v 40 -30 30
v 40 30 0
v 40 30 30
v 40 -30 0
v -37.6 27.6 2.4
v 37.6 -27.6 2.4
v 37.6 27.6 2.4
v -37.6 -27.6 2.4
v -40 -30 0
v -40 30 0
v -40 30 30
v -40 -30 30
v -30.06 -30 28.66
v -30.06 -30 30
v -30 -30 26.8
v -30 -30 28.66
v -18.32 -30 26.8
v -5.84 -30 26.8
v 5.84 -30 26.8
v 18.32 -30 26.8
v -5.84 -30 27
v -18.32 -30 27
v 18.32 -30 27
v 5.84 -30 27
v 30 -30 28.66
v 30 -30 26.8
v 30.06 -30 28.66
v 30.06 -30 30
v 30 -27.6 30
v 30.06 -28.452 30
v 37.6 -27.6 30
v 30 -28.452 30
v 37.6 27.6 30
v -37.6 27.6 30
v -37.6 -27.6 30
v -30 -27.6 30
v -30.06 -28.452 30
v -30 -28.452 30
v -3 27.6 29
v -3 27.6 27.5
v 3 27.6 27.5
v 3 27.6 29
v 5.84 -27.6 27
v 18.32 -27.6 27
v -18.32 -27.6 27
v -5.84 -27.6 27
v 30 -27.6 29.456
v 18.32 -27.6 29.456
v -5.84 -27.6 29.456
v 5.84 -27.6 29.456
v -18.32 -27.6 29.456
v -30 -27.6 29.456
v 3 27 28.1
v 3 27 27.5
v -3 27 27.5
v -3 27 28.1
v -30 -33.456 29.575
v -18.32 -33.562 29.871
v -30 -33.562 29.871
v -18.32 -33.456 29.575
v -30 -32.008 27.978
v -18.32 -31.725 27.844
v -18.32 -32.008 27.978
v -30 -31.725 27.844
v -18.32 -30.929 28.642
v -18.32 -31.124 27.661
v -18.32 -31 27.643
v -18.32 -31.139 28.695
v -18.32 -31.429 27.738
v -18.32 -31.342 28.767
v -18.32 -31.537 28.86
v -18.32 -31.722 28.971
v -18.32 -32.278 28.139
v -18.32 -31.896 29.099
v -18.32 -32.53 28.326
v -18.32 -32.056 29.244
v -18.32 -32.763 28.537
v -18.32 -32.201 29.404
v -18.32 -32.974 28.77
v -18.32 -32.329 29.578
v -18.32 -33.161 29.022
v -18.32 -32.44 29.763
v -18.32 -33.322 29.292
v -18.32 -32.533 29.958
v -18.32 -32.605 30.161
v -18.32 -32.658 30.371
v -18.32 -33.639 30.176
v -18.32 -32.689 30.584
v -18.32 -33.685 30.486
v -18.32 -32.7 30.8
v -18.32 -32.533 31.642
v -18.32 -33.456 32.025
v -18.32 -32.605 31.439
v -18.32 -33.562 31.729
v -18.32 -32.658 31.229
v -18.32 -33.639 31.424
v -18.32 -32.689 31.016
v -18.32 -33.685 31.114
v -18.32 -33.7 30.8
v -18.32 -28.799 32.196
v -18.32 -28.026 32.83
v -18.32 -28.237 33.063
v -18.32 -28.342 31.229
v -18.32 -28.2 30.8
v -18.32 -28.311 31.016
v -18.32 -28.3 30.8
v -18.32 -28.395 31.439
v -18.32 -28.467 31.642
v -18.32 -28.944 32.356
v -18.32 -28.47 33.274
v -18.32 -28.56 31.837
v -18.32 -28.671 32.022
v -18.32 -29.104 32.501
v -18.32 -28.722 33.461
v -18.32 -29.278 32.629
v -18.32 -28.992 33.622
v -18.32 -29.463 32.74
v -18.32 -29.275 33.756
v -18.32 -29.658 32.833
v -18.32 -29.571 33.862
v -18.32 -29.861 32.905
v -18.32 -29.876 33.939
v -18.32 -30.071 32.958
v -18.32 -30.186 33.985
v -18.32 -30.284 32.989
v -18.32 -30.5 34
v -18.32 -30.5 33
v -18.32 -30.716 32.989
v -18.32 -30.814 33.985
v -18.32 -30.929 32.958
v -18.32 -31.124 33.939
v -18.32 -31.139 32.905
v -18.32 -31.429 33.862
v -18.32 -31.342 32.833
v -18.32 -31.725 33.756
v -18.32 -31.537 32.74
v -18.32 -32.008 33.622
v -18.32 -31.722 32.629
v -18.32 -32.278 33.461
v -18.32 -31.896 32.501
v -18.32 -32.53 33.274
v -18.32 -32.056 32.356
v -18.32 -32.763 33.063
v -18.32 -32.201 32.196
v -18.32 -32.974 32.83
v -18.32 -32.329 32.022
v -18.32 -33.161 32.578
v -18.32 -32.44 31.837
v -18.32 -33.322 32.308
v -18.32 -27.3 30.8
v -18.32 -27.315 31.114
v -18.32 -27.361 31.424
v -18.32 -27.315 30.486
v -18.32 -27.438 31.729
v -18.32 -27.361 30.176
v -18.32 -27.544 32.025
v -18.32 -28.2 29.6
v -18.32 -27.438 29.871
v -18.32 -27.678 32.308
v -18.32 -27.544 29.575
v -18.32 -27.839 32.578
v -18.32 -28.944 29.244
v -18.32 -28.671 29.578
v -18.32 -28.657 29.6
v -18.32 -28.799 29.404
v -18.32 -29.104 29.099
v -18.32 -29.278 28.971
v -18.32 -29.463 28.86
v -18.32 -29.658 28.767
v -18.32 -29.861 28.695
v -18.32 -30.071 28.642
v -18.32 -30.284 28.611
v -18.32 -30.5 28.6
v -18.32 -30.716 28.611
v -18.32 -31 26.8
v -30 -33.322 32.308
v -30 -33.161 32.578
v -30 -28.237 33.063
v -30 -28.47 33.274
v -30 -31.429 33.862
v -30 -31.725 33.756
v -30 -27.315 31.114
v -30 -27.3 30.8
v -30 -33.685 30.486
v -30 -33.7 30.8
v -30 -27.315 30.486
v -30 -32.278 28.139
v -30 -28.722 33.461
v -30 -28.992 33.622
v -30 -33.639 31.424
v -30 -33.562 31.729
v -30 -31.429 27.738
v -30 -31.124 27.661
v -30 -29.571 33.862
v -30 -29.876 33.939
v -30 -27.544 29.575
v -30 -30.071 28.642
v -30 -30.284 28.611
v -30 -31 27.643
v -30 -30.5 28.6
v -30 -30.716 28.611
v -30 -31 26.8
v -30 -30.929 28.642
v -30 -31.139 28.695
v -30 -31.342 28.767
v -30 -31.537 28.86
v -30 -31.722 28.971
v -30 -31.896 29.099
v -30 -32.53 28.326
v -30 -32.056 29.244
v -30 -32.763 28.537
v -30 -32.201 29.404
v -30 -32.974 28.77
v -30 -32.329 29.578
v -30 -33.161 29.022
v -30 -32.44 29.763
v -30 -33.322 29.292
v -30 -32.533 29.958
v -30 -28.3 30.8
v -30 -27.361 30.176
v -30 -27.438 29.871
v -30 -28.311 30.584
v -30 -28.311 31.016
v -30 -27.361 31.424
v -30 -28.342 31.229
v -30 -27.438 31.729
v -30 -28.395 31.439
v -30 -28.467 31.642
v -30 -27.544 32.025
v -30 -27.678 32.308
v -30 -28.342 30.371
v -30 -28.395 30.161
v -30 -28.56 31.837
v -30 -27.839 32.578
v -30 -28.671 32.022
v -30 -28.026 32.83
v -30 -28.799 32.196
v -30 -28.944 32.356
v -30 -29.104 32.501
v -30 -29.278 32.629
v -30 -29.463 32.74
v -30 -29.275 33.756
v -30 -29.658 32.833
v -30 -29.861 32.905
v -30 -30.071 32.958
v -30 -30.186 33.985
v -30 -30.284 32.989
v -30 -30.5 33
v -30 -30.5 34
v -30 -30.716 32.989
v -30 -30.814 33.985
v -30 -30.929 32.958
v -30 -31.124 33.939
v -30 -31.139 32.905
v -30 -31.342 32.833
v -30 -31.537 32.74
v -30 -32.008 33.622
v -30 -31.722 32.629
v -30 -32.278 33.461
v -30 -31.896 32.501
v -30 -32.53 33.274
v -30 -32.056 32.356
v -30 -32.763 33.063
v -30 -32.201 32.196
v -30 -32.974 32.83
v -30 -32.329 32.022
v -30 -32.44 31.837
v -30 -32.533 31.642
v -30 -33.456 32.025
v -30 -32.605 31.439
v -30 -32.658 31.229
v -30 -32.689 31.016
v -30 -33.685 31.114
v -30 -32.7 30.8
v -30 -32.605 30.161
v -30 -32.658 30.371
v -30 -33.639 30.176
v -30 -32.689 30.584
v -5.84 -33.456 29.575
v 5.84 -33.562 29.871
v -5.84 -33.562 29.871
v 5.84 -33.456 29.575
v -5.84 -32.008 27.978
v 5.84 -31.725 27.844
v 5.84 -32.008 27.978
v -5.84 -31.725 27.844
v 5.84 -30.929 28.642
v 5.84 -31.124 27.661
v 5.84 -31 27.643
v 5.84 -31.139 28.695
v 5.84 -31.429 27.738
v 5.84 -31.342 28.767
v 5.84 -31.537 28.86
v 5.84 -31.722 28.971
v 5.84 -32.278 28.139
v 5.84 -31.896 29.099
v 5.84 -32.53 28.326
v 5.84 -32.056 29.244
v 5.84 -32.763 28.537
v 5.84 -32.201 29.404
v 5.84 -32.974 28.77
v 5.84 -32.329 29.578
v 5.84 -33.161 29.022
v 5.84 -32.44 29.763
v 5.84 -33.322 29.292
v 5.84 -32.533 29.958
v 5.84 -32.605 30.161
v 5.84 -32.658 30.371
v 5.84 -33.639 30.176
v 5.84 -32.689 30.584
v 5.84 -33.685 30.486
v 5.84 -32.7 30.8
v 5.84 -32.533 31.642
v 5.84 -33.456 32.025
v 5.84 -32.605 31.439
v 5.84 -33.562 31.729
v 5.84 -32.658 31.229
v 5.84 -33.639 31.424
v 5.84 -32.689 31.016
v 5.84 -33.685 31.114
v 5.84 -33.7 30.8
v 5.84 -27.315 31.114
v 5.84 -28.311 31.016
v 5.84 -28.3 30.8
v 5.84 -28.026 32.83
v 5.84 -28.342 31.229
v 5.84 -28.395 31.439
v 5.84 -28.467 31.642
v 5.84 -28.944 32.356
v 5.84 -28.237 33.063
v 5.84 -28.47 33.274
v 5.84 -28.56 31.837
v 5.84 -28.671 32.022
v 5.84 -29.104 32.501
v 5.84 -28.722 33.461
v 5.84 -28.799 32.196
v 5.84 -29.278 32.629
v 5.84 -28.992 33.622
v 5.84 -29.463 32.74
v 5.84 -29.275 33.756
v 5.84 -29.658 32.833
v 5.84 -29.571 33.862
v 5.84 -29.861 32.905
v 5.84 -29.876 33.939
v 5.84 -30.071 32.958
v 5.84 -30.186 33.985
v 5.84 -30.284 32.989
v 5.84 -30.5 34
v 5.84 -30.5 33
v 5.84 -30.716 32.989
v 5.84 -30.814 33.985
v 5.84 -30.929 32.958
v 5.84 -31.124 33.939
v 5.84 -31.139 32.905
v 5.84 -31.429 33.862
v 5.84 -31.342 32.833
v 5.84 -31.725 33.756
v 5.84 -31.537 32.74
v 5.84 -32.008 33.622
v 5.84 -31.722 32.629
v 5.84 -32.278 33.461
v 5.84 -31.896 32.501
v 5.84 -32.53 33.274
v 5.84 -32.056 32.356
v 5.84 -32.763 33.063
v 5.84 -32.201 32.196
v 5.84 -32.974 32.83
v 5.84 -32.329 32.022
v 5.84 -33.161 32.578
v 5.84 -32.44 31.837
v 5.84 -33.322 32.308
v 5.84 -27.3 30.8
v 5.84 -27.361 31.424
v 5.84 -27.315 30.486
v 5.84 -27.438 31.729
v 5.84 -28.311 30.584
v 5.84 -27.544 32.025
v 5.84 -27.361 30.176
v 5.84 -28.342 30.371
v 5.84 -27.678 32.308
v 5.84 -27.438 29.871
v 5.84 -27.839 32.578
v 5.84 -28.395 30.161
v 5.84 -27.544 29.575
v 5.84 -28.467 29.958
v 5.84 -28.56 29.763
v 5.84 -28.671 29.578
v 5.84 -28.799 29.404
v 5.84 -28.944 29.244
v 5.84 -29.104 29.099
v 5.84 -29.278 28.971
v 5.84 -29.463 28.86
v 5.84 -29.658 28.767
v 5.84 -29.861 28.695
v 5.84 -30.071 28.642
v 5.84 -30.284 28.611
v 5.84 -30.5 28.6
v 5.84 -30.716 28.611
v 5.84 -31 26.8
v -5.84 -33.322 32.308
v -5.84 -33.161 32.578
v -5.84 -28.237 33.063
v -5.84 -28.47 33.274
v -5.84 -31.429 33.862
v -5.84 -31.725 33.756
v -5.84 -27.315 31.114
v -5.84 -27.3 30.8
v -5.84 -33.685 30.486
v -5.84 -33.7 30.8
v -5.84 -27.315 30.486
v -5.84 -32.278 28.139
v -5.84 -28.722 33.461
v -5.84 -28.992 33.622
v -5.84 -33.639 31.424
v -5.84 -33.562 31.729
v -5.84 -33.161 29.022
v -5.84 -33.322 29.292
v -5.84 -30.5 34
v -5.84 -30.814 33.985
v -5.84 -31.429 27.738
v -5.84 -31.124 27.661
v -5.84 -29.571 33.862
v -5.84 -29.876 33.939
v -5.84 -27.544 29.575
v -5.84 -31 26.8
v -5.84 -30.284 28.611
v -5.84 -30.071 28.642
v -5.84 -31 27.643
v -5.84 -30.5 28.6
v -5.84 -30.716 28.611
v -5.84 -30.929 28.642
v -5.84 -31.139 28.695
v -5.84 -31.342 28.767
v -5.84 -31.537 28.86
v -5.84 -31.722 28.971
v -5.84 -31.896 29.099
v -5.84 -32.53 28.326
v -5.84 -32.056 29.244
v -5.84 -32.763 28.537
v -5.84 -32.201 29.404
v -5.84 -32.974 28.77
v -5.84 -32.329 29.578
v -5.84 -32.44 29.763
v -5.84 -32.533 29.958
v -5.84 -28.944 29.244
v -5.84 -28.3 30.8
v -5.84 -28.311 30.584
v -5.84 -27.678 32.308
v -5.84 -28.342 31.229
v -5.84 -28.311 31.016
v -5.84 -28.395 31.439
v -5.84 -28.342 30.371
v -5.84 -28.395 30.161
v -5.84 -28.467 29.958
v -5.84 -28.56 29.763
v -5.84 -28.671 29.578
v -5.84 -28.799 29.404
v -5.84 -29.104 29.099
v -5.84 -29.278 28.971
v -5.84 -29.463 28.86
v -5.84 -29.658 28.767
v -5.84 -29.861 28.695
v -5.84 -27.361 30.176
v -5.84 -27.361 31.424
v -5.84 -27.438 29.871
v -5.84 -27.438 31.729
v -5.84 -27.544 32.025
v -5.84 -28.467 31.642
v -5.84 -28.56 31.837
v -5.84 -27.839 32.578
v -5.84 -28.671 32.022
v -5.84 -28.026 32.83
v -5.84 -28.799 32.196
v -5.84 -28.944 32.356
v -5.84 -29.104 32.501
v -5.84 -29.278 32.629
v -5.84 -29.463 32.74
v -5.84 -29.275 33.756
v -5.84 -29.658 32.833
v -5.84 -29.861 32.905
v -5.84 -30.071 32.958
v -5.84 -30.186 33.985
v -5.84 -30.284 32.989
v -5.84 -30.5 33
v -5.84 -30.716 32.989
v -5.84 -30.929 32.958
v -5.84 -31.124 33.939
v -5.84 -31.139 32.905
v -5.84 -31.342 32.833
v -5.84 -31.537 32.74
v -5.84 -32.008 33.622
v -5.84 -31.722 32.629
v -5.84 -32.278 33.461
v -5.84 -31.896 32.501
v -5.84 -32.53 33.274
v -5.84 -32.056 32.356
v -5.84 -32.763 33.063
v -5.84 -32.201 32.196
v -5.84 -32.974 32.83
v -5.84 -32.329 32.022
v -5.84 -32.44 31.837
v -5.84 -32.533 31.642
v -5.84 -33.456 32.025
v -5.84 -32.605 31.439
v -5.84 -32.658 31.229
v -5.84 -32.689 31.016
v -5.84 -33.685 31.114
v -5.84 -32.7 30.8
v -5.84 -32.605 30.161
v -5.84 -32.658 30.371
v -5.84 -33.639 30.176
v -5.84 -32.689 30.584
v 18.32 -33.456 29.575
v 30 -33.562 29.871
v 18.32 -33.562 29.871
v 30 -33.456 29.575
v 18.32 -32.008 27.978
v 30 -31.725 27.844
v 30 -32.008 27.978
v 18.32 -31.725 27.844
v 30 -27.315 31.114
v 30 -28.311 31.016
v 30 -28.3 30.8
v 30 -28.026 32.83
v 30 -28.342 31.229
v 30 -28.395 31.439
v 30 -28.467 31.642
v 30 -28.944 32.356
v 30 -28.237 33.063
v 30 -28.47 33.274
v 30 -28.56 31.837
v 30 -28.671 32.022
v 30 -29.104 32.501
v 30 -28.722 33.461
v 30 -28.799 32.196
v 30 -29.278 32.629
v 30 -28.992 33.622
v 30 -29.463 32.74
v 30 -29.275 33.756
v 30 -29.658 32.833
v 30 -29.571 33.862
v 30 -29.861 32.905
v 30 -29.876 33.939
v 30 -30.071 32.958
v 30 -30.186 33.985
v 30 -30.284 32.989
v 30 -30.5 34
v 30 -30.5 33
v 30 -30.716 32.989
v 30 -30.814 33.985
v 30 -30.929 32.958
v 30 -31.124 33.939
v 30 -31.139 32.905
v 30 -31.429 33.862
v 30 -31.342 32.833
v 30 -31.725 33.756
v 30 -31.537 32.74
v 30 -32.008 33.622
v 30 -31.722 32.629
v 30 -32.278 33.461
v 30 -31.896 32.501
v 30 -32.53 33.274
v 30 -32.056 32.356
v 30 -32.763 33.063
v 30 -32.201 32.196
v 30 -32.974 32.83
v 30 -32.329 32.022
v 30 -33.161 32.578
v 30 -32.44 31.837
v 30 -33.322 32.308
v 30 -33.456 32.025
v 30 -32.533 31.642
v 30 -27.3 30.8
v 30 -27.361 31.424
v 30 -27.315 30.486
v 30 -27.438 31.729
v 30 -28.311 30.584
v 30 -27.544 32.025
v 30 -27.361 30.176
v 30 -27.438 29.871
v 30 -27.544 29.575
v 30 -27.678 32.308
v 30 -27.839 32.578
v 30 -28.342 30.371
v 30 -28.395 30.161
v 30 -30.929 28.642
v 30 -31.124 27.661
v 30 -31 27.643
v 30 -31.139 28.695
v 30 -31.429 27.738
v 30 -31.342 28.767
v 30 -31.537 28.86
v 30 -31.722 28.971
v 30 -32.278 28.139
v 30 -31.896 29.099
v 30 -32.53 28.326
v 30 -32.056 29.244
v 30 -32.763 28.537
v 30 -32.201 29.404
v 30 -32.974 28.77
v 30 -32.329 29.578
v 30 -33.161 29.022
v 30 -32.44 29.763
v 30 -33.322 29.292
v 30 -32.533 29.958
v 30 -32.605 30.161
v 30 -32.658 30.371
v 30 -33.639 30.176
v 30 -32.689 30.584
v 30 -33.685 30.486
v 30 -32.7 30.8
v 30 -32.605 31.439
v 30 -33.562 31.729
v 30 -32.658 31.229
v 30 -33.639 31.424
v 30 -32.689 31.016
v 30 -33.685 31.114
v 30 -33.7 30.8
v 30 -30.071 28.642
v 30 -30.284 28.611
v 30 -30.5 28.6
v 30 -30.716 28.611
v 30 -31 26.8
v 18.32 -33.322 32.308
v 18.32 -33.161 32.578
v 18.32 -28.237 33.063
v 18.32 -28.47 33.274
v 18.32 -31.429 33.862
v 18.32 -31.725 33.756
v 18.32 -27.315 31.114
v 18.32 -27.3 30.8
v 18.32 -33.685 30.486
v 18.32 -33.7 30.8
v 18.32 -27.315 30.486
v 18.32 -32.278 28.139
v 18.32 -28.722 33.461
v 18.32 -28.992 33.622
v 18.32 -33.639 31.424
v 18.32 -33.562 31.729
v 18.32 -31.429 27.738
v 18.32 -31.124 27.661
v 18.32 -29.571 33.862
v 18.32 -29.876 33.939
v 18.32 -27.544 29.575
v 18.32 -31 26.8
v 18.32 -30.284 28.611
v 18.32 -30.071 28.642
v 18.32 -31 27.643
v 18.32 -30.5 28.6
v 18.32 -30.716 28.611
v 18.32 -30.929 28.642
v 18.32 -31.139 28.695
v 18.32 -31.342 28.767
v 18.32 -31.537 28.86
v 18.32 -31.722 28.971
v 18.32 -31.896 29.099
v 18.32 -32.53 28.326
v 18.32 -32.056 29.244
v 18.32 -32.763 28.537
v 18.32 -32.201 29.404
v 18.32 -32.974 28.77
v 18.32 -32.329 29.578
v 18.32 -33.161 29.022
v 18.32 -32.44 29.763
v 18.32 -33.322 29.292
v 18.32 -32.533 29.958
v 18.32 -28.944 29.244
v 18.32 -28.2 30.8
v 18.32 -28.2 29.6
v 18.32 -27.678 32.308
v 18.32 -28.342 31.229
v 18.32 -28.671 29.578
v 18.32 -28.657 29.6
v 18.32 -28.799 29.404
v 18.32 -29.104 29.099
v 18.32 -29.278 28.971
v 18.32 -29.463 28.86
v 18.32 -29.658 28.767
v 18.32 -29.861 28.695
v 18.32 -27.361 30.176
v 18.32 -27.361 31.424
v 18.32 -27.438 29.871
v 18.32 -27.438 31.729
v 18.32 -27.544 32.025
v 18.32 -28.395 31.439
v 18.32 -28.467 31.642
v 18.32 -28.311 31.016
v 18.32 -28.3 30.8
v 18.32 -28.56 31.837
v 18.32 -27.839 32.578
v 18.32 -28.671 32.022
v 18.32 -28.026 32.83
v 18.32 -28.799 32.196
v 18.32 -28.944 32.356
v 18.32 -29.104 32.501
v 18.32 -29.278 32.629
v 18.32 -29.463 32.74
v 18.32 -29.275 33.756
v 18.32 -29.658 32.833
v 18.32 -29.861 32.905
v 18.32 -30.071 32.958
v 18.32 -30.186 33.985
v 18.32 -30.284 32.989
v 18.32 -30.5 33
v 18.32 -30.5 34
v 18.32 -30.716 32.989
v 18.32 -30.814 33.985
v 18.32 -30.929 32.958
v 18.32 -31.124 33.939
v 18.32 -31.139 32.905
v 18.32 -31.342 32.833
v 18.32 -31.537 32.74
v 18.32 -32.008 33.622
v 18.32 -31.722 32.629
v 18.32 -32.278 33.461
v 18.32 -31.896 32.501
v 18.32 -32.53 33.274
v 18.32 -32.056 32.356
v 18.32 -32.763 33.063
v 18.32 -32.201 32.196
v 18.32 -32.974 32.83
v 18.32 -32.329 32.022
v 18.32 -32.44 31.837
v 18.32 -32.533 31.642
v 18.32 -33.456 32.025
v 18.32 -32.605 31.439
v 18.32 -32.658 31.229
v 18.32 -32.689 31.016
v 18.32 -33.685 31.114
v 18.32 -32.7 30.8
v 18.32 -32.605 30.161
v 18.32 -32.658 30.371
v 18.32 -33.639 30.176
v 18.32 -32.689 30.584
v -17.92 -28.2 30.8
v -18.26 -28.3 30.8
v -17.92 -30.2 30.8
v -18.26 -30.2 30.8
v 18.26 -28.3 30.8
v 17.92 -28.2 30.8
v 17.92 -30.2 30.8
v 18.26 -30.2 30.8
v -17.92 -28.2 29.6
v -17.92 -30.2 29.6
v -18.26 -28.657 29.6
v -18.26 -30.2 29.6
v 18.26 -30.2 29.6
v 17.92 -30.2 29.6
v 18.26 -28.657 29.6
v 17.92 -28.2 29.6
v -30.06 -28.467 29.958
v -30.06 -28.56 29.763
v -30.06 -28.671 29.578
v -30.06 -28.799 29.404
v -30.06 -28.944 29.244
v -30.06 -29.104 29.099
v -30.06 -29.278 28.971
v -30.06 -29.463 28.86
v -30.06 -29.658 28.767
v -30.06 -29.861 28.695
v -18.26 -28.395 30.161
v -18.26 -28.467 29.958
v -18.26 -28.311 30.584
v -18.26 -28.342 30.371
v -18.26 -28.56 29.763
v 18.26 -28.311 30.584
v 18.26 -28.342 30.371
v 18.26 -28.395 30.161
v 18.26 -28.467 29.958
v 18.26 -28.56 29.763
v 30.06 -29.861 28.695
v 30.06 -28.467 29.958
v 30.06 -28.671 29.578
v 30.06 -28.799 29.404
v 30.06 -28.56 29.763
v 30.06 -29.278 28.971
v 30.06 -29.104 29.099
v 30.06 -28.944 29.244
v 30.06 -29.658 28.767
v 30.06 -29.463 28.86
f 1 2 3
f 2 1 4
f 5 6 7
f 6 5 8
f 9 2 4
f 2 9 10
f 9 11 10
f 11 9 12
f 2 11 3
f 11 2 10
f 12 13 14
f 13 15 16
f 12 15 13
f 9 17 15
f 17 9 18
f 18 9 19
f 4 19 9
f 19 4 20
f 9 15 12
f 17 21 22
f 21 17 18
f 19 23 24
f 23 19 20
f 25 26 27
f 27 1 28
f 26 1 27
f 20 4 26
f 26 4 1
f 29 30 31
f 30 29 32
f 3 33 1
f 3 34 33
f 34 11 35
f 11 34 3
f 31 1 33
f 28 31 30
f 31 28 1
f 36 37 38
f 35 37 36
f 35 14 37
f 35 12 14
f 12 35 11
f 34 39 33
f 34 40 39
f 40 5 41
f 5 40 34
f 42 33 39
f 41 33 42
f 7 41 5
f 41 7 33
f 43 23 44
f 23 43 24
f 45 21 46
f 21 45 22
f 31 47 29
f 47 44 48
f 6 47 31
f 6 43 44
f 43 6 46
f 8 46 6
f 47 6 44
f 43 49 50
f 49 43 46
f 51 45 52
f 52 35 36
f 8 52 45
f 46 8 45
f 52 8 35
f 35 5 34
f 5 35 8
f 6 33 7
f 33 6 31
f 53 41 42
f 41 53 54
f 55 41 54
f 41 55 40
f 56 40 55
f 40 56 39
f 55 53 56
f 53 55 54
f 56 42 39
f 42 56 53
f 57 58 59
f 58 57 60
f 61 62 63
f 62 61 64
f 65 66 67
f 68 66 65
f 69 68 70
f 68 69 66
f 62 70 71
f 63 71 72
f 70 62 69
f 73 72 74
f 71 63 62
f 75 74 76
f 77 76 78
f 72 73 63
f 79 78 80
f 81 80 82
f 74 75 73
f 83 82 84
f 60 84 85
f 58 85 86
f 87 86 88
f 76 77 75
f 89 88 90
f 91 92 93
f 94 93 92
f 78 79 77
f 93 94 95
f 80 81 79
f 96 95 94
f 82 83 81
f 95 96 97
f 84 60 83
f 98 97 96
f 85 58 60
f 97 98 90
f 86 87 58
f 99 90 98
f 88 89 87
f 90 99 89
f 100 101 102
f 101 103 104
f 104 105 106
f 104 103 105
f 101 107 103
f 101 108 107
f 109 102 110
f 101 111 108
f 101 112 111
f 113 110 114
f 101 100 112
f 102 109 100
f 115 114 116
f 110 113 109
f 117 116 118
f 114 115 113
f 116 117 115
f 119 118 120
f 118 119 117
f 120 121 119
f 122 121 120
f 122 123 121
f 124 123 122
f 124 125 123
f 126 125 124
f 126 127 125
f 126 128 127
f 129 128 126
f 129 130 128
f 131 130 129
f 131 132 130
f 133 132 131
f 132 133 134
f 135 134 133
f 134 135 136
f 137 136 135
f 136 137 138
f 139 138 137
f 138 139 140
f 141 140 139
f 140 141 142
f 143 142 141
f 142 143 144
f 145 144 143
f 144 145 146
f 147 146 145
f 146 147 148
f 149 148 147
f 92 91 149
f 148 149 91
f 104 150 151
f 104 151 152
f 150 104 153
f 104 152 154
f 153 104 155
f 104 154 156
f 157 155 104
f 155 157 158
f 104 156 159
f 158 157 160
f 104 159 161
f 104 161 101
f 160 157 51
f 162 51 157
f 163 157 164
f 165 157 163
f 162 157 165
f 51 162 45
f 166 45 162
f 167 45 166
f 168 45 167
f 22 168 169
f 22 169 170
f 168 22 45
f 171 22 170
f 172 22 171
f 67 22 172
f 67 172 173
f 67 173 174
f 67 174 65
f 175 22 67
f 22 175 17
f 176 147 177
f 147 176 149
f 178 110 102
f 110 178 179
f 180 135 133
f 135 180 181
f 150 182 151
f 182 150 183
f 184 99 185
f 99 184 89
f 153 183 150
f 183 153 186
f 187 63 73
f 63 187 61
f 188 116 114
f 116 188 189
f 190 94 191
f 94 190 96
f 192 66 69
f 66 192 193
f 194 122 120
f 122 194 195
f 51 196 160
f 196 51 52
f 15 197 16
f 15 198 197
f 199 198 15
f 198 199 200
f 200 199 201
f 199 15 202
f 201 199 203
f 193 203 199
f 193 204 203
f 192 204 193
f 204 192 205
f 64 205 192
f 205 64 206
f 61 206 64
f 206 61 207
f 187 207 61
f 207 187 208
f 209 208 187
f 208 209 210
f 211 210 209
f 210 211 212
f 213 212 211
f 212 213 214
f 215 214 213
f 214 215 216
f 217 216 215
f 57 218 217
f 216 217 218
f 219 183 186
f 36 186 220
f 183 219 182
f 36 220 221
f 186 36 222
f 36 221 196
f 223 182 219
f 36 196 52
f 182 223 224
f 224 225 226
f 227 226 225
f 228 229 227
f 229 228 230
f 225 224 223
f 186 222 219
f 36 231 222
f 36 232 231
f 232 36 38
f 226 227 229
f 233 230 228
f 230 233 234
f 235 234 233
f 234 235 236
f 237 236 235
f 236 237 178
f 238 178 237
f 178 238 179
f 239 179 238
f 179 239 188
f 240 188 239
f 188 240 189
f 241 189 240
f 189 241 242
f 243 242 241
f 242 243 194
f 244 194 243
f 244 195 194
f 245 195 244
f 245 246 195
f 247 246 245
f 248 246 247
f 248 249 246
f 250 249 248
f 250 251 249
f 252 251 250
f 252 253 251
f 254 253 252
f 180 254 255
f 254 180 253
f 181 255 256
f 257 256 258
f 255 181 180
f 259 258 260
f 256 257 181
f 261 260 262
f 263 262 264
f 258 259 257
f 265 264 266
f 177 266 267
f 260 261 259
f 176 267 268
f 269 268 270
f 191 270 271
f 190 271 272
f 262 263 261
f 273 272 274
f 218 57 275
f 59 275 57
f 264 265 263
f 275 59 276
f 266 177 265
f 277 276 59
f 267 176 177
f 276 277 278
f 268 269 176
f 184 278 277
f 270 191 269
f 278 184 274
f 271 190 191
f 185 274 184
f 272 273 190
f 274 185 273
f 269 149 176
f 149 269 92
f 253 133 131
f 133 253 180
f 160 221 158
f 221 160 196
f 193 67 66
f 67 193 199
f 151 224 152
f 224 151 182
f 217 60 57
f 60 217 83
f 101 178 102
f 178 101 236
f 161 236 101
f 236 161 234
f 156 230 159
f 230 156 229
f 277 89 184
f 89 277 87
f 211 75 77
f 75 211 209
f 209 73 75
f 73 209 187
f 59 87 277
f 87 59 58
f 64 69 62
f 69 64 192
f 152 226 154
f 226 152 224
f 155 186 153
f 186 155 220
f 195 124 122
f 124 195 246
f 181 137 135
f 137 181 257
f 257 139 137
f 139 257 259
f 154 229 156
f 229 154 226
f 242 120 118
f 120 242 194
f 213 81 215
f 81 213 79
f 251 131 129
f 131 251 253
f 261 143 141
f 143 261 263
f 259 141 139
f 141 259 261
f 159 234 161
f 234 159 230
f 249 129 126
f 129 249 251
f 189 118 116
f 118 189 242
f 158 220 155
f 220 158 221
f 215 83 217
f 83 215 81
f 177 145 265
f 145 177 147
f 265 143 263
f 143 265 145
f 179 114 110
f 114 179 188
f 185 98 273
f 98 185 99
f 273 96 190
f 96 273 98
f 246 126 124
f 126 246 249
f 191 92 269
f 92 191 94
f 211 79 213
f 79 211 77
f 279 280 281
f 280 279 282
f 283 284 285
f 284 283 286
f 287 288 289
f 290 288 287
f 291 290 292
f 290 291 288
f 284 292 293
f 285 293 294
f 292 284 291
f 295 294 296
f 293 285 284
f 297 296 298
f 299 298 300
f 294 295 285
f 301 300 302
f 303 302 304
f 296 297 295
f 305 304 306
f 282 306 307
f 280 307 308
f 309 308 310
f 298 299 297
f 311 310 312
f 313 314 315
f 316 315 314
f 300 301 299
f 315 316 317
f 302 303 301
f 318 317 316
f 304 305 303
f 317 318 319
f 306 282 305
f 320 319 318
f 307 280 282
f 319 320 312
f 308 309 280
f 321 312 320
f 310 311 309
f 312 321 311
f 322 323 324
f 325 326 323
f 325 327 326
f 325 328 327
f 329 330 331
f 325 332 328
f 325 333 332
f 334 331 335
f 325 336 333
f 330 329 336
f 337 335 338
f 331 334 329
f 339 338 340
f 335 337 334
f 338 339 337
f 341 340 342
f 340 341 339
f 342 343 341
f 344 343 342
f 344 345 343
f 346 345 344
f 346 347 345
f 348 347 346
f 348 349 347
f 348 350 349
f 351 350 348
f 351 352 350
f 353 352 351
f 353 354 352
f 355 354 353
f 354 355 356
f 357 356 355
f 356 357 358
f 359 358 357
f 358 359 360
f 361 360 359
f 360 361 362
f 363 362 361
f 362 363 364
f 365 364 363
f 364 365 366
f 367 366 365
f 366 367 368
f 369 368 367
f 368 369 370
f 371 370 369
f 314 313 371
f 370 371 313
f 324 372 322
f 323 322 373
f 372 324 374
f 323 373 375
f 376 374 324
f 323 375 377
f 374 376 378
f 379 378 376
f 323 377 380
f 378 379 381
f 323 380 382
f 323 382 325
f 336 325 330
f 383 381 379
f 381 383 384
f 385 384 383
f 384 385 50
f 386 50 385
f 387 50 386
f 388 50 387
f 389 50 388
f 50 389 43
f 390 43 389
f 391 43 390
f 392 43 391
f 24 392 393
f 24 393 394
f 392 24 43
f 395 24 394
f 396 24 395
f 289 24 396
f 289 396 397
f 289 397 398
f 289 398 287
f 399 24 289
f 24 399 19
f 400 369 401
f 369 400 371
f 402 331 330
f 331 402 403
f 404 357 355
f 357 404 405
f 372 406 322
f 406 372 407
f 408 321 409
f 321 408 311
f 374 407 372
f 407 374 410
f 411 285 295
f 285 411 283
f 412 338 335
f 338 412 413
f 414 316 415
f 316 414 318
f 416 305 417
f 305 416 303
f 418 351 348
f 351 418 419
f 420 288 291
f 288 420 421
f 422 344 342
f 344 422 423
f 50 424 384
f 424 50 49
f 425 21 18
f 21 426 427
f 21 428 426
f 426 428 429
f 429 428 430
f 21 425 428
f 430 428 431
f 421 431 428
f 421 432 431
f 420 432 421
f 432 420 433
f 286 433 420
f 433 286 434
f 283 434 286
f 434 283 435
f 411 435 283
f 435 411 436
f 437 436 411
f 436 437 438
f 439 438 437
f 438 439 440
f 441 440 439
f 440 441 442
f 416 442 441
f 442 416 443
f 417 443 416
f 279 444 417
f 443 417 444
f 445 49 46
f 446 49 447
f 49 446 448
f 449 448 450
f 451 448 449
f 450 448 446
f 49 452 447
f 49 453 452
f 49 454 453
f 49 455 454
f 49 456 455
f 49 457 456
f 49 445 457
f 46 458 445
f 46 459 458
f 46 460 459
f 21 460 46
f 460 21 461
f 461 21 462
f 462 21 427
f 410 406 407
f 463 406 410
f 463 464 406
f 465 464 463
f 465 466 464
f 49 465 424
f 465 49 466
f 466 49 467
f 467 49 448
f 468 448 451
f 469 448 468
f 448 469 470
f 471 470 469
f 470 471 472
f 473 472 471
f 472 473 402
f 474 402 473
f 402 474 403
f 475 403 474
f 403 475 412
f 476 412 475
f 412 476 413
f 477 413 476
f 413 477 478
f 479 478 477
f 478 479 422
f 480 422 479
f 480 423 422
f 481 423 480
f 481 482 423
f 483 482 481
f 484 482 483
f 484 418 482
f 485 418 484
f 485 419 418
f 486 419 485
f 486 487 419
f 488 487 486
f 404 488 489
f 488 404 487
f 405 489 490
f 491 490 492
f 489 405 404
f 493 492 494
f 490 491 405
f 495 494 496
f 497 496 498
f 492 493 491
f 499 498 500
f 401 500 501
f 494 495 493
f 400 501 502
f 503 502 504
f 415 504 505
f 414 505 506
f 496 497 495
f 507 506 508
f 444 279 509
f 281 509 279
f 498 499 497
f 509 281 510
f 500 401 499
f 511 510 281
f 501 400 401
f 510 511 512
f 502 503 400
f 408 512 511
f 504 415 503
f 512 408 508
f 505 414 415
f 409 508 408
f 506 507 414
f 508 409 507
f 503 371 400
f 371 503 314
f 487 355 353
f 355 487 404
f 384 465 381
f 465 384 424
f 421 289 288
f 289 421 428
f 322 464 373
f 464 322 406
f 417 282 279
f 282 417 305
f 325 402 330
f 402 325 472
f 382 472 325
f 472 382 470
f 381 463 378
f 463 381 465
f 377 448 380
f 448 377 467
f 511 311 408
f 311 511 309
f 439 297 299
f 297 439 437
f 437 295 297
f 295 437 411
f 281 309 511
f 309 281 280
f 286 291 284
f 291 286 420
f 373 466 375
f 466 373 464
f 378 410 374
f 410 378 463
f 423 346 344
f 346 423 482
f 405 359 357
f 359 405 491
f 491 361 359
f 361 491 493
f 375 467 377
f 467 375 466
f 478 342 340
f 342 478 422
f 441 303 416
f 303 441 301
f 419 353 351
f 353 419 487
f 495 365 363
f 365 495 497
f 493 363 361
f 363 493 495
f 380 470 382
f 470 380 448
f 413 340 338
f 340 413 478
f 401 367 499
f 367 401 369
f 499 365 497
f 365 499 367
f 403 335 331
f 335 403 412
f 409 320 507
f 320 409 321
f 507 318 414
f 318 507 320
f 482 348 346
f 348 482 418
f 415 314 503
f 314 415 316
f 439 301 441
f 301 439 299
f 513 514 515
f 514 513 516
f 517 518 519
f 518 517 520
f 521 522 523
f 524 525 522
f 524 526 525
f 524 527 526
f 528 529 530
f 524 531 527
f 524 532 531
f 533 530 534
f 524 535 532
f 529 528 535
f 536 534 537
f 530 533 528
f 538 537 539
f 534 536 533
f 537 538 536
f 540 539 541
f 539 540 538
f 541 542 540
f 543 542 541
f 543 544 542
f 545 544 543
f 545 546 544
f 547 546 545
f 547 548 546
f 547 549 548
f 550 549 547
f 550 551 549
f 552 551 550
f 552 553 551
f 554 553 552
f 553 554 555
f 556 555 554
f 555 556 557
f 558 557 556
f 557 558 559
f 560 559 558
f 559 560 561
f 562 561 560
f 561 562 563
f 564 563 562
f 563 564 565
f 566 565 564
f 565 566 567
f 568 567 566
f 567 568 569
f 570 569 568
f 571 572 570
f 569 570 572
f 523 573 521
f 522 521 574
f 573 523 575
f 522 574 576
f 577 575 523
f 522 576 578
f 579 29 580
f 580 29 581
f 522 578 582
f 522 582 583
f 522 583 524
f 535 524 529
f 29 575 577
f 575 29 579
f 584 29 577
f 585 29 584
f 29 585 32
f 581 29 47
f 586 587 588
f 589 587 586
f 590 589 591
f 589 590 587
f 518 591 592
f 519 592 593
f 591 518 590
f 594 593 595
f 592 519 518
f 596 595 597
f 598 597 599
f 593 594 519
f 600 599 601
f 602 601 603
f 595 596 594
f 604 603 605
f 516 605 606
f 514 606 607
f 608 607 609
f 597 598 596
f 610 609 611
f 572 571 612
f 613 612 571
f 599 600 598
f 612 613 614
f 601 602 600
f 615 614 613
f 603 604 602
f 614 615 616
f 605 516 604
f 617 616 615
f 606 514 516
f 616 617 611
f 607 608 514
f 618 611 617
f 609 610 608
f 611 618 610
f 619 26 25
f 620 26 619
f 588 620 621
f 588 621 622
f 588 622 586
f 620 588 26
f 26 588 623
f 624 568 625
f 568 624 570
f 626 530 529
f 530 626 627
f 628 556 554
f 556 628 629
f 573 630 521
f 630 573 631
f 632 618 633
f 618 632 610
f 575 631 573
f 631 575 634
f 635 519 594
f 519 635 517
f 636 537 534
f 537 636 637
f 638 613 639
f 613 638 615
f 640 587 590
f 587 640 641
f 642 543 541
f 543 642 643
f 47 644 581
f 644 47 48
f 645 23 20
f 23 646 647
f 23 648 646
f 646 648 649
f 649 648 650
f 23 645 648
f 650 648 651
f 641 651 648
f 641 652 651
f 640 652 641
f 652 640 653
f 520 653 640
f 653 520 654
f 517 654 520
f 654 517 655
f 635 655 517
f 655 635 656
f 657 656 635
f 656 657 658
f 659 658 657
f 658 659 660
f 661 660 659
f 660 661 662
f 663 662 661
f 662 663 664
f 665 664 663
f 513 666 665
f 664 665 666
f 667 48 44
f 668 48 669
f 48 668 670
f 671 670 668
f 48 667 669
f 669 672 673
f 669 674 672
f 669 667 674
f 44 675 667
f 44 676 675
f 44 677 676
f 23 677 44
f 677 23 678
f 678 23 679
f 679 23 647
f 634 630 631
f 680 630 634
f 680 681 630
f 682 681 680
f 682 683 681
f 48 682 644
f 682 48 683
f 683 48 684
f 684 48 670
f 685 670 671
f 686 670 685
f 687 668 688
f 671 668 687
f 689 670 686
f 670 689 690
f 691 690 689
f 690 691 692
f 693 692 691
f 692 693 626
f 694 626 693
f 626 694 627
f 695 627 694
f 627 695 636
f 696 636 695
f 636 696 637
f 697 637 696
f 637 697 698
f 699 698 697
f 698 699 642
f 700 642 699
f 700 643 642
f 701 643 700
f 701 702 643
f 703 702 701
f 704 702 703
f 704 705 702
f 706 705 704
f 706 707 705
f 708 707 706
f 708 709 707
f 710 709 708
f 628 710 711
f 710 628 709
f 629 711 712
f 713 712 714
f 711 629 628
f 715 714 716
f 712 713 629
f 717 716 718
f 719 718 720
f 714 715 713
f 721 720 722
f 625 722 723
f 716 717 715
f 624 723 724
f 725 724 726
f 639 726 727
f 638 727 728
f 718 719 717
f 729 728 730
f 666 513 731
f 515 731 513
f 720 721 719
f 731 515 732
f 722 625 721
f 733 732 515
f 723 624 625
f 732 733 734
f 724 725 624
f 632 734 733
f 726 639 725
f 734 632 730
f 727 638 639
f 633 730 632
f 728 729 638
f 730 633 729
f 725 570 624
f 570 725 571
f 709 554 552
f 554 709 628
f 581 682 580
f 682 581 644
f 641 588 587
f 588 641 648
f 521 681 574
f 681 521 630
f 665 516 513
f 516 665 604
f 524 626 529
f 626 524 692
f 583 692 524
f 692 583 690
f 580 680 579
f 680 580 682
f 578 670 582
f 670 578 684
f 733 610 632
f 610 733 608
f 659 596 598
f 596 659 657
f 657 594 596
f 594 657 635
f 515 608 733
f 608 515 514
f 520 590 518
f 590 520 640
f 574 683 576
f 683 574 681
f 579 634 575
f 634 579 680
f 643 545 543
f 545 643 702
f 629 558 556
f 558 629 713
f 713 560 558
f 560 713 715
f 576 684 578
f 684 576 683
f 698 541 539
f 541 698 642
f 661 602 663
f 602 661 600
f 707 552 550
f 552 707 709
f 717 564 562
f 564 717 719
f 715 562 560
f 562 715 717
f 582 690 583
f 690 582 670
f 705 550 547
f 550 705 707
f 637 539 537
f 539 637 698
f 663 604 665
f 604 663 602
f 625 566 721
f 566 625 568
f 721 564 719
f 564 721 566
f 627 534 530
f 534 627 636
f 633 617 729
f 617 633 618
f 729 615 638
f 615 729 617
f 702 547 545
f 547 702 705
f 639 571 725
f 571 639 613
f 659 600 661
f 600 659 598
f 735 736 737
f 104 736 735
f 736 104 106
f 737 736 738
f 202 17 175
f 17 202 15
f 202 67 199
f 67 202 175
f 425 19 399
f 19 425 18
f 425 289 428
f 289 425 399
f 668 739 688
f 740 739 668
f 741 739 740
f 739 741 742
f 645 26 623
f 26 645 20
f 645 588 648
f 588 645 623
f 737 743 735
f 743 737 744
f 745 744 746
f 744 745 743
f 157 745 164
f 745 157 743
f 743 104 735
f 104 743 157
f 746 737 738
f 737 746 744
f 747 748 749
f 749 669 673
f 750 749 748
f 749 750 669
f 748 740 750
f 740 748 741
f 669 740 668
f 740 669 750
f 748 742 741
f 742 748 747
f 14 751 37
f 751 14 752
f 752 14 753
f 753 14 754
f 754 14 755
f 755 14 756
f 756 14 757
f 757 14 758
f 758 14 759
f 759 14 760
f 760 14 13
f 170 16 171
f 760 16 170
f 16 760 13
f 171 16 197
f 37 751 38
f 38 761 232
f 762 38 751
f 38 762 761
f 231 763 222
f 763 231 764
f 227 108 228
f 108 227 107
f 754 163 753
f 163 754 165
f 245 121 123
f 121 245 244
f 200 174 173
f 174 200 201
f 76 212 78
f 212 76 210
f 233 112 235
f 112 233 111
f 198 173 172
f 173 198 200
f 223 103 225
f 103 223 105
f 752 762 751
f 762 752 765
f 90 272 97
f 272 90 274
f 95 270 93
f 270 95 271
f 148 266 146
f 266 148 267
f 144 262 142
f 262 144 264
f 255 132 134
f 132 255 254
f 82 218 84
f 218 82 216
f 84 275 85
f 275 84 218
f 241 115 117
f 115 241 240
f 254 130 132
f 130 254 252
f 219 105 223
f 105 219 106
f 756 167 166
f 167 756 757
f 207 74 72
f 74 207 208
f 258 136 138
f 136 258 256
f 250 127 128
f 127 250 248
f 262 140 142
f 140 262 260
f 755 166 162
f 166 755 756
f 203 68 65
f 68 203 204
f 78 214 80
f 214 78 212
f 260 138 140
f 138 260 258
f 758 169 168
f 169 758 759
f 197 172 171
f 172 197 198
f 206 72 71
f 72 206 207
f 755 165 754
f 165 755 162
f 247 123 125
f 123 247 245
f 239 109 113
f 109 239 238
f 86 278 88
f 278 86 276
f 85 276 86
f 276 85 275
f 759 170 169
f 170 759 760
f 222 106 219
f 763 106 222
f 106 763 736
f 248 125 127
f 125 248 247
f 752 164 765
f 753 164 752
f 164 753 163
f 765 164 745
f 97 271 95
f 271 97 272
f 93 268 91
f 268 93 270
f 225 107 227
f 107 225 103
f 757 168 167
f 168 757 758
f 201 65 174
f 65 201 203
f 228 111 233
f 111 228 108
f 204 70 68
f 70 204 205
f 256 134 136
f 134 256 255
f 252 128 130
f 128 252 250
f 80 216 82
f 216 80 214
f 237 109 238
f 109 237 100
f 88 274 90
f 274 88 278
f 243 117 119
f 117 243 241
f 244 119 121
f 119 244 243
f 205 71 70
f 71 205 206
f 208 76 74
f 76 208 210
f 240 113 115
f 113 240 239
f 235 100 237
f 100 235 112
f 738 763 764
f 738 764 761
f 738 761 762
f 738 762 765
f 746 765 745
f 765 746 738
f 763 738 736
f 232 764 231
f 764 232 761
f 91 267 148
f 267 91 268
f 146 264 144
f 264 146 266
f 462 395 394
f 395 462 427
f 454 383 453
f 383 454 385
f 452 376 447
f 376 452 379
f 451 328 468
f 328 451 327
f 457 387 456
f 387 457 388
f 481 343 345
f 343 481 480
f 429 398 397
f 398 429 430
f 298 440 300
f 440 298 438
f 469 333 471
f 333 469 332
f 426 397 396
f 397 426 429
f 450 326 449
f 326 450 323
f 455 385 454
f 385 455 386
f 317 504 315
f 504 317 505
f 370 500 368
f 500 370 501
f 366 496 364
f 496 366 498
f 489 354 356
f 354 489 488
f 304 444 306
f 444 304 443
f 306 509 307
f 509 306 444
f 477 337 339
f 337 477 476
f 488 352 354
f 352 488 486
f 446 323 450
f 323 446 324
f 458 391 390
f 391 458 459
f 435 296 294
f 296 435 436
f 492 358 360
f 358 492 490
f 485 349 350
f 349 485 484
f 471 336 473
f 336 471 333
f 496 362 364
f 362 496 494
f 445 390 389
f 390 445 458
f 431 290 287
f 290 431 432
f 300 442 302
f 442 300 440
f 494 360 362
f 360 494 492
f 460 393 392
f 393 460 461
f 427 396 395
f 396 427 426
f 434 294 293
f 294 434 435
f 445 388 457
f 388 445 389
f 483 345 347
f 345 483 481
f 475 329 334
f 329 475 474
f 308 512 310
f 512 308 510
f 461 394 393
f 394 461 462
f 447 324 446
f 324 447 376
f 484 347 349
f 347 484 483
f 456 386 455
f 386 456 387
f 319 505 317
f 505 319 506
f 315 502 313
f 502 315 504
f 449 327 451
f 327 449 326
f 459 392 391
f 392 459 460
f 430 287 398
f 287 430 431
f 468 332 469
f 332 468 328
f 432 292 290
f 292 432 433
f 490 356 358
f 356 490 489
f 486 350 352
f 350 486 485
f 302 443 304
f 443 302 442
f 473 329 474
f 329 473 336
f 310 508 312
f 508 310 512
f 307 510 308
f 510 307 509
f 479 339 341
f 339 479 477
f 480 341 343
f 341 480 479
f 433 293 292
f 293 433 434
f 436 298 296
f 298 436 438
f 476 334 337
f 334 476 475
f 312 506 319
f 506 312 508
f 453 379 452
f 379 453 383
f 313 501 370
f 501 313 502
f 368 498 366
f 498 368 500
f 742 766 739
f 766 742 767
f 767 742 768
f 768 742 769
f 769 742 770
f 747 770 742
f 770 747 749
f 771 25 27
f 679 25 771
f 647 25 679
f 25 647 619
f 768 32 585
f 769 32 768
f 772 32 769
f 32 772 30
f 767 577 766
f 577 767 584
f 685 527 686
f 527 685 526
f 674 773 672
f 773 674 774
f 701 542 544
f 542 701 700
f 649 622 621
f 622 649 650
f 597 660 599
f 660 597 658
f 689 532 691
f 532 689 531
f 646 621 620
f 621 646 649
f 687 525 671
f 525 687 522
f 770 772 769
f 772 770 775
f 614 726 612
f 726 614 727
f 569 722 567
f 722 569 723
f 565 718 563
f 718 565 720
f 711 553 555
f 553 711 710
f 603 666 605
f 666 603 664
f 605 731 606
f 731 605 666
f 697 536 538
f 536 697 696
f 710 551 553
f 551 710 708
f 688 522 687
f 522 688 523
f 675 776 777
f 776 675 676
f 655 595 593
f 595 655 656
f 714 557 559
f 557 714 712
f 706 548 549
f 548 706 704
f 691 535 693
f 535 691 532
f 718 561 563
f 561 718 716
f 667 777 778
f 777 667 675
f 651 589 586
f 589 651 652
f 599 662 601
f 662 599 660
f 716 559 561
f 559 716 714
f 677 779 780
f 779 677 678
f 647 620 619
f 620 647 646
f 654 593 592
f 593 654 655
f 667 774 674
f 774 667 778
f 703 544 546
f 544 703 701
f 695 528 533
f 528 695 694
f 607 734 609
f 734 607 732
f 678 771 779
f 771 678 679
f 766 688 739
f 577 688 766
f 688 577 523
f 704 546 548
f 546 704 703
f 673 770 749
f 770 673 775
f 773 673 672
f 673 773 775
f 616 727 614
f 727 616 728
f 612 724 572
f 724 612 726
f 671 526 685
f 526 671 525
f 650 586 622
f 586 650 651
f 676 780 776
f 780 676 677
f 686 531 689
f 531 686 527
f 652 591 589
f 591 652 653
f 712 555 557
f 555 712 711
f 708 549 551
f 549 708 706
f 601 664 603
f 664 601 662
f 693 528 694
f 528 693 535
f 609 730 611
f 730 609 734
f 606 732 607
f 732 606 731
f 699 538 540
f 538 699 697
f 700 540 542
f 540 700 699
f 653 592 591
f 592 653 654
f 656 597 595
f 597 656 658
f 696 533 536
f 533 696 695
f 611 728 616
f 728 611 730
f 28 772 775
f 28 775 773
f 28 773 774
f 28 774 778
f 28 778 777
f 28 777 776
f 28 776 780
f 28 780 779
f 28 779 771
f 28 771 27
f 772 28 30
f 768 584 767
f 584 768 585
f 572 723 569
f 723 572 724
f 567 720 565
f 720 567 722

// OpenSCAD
// Box with print-in-place hinge (v4: bridge webs to kill band overhangs)
part = "box";
cadverify_only = "";
module instance(name, part, unit = 1) {
    echo(cadverify_instance = [name, part, unit]);
    if (cadverify_only == "" || cadverify_only == name) children();
}

Rkn = 3.2; rbore = 2.2; rpin = 1.9;
yh = -30.5; zh = 30.8;
lid_zh = 3.4;
lid_lift = 27.4;
pin_lift_z = 27.8; pin_shift_y = -30.5;
k0x0=-30; k0x1=-18.32;
k1x0=-17.92; k1x1=-6.24;
k2x0=-5.84; k2x1=5.84;
k3x0=6.24; k3x1=17.92;
k4x0=18.32; k4x1=30;

$fn = 64;

module xcyl(x0, x1, r, y, z) {
    translate([x0, y, z]) rotate([0, 90, 0]) cylinder(r = r, h = x1 - x0);
}

module box_part() {
    difference() {
        union() {
            translate([-40, -30, 0]) cube([80, 60, 2.4]);
            translate([-40, 27.6, 2.4]) cube([80, 2.4, 27.6]);
            translate([-40, -30, 2.4]) cube([80, 2.4, 24.6]);
            translate([-40, -30, 27.0]) cube([11, 2.4, 3.0]);
            translate([29, -30, 27.0]) cube([11, 2.4, 3.0]);
            translate([-40, -27.6, 2.4]) cube([2.4, 55.2, 27.6]);
            translate([37.6, -27.6, 2.4]) cube([2.4, 55.2, 27.6]);
            // catch bump (front inner) with 45 deg chamfered underside: no overhang
            // wedge: full 1.5 tall at wall face (y27.6), tapering to 0.6 tall at y27.0
            translate([-3, 27.0, 27.5]) cube([6, 0.6, 0.6]);
            polyhedron(
                points=[[-3,27.0,28.1],[3,27.0,28.1],
                        [-3,27.6,28.1],[3,27.6,28.1],
                        [-3,27.6,29.0],[3,27.6,29.0]],
                faces=[[0,2,3,1],[2,4,5,3],[0,1,5,4],[0,4,2],[1,3,5]]
            );
            // hinge knuckles + support webs tying them to the back wall
            xcyl(k0x0, k0x1, Rkn, yh, zh);
            xcyl(k2x0, k2x1, Rkn, yh, zh);
            xcyl(k4x0, k4x1, Rkn, yh, zh);
            translate([k0x0, -31, 26.8]) cube([k0x1-k0x0, 3.4, 4.0]);
            translate([k2x0, -31, 26.8]) cube([k2x1-k2x0, 3.4, 4.0]);
            translate([k4x0, -31, 26.8]) cube([k4x1-k4x0, 3.4, 4.0]);
            // two bridge webs filling wall-to-knuckle band gaps (support-free cover)
            translate([-18.32, -30.2, 29.6]) cube([0.4, 2.0, 1.2]);
            translate([17.92, -30.2, 29.6]) cube([0.4, 2.0, 1.2]);
        }
        xcyl(k0x0-0.06, k0x1+0.06, rbore, yh, zh);
        xcyl(k2x0-0.06, k2x1+0.06, rbore, yh, zh);
        xcyl(k4x0-0.06, k4x1+0.06, rbore, yh, zh);
    }
}

module lid_part() {
    difference() {
        union() {
            translate([-40, -30, 10.6]) cube([80, 60, 2.4]);
            translate([-40, 27.6, 3]) cube([80, 2.4, 7.6]);
            translate([k1x0, -30, 3]) cube([k1x1-k1x0, 2.4, 7.6]);
            translate([k3x0, -30, 3]) cube([k3x1-k3x0, 2.4, 7.6]);
            translate([-40, -30, 3]) cube([11, 2.4, 7.6]);
            translate([29, -30, 3]) cube([11, 2.4, 7.6]);
            translate([-40, -27.6, 3]) cube([2.4, 55.2, 7.6]);
            translate([37.6, -27.6, 3]) cube([2.4, 55.2, 7.6]);
            translate([-37.2, 25.2, 0]) cube([74.4, 2.0, 10.6]);
            translate([-37.2, -27.2, 0]) cube([74.4, 2.0, 10.6]);
            translate([-37.2, -25.2, 0]) cube([2.0, 50.4, 10.6]);
            translate([35.2, -25.2, 0]) cube([2.0, 50.4, 10.6]);
            xcyl(k1x0, k1x1, Rkn, yh, lid_zh);
            xcyl(k3x0, k3x1, Rkn, yh, lid_zh);
            translate([k1x0, -31, 0]) cube([k1x1-k1x0, 3.4, 5]);
            translate([k3x0, -31, 0]) cube([k3x1-k3x0, 3.4, 5]);
            // filler webs closing lid-knuckle band overlap with box lugs
            translate([-6.24, -30.2, 0]) cube([0.4, 2.0, 1.2]);
            translate([5.84, -30.2, 0]) cube([0.4, 2.0, 1.2]);
        }
        xcyl(k1x0-0.06, k1x1+0.06, rbore, yh, lid_zh);
        xcyl(k3x0-0.06, k3x1+0.06, rbore, yh, lid_zh);
        translate([-3.3, 26.3, -0.05]) cube([6.6, 1.5, 2.05]);
    }
}

module pin_part() {
    union() {
        xcyl(-32.4, 32.4, rpin, 0, 3);
        xcyl(30.4, 32.4, 3, 0, 3);
        xcyl(-32.4, -30.4, 3, 0, 3);
    }
}

if (part == "box") {
    echo(cadverify_spec = [
        ["bounds", [[-40, -33.7, 0], [40, 30, 34.0]]],
        ["bodies", 1],
        ["through_holes", 3],
        ["support_faces", [["bed", "-z", 4000]]],
        ["overhangs_allowed", [["hinge knuckles, bores and wall cutouts print in place", [[-30.2, -33.9, 26.5], [30.2, -27.1, 33.5]]]]],
        ["copies", 1],
        ["details", [
            ["floor", "thickness", [0, 0, -1], [0, 0, 1], 2.4],
            ["front_wall", "thickness", [0, 31, 15], [0, -1, 0], 2.4],
            ["cavity", "void", [[-37.6, -27.6, 2.4], [37.6, 27.6, 29.9]], 0.9],
            ["hinge_bore", "hole", [-31, -30.5, 30.8], [1, 0, 0], [[0, 4.4], [11.6, 4.4]]],
            ["catch_bump", "material", [[-3, 27.0, 27.5], [3, 27.6, 29.0]], 0.9],
            ["hinge_view", "view", [[-30, -34, 26.5], [30, -27, 34.5]]]
        ]]
    ]);
    box_part();
} else if (part == "lid") {
    echo(cadverify_spec = [
        ["bounds", [[-40, -33.7, 0], [40, 30, 13]]],
        ["bodies", 1],
        ["through_holes", 2],
        ["support_faces", [["bed", "-z", 300]]],
        ["overhangs_allowed", [
            ["hinge knuckles and bores print in place", [[-18.2, -33.9, 0], [18.2, -27.1, 4.2]]],
            ["lid top bridging over plug cavity", [[-37.2, -24.9, 10.1], [37.2, 25.2, 11.1]]]
        ]],
        ["copies", 1],
        ["details", [
            ["top", "thickness", [0, 0, 14], [0, 0, -1], 2.4],
            ["skirt", "thickness", [0, 31, 6], [0, -1, 0], 2.4],
            ["plug_cavity", "void", [[-35.2, -24.9, 0], [35.2, 25.2, 10.5]], 0.9],
            ["hinge_bore", "hole", [-18.6, -30.5, 3.4], [1, 0, 0], [[0, 4.4], [11.6, 4.4]]],
            ["catch_notch", "void", [[-3.3, 26.3, 0], [3.3, 27.8, 2.0]], 0.9],
            ["catch_view", "view", [[-5, 26, 0], [5, 28.5, 3]]]
        ]]
    ]);
    lid_part();
} else if (part == "pin") {
    echo(cadverify_spec = [
        ["bounds", [[-32.4, -3, 0], [32.4, 3, 6]]],
        ["bodies", 1],
        ["support_faces", []],
        ["overhangs_allowed", [["pin shaft underside bridges with 0.3 gap", [[-32.4, -1.9, 0], [32.4, 1.9, 1.6]]]]],
        ["copies", 1],
        ["details", [
            ["shaft", "thickness", [0, 3, 3], [0, -1, 0], 3.8],
            ["head", "material", [[30.4, -3, 0], [32.4, 3, 6]], 0.7],
            ["pin_view", "view", [[-32.4, -3, 0], [32.4, 3, 6]]]
        ]]
    ]);
    pin_part();
} else if (part == "assembly") {
    echo(cadverify_spec = [
        ["bounds", [[-40, -33.7, 0], [40, 30, 40.4]]],
        ["support_faces", [["bed", "-z", 4000]]],
        ["allowed_interferences", []],
        ["motions", [
            ["lid_open", ["lid"], "rotate", [0, -30.5, 30.8], [1, 0, 0], [0, 110], ["flex", [["lid", "box", 0.5, "catch bump clearance pass"]]]]
        ]],
        ["assembly_order", [
            [["box"], [0, 0, 0]],
            [["lid"], [0, 0, -1]],
            [["pin"], [1, 0, 0]]
        ]],
        ["print_in_place", 0.3],
        ["overhangs_allowed", [
            ["hinge undersides, pin bridge and cutouts in place", [[-33, -34, 26.5], [33, -27, 34.8]]],
            ["lid top bridging over box cavity", [[-37.2, -24.9, 37.5], [37.2, 25.2, 38.5]]]
        ]]
    ]);
    instance("box", "box") box_part();
    instance("lid", "lid") translate([0, 0, lid_lift]) lid_part();
    instance("pin", "pin") translate([0, pin_shift_y, pin_lift_z]) pin_part();
}
